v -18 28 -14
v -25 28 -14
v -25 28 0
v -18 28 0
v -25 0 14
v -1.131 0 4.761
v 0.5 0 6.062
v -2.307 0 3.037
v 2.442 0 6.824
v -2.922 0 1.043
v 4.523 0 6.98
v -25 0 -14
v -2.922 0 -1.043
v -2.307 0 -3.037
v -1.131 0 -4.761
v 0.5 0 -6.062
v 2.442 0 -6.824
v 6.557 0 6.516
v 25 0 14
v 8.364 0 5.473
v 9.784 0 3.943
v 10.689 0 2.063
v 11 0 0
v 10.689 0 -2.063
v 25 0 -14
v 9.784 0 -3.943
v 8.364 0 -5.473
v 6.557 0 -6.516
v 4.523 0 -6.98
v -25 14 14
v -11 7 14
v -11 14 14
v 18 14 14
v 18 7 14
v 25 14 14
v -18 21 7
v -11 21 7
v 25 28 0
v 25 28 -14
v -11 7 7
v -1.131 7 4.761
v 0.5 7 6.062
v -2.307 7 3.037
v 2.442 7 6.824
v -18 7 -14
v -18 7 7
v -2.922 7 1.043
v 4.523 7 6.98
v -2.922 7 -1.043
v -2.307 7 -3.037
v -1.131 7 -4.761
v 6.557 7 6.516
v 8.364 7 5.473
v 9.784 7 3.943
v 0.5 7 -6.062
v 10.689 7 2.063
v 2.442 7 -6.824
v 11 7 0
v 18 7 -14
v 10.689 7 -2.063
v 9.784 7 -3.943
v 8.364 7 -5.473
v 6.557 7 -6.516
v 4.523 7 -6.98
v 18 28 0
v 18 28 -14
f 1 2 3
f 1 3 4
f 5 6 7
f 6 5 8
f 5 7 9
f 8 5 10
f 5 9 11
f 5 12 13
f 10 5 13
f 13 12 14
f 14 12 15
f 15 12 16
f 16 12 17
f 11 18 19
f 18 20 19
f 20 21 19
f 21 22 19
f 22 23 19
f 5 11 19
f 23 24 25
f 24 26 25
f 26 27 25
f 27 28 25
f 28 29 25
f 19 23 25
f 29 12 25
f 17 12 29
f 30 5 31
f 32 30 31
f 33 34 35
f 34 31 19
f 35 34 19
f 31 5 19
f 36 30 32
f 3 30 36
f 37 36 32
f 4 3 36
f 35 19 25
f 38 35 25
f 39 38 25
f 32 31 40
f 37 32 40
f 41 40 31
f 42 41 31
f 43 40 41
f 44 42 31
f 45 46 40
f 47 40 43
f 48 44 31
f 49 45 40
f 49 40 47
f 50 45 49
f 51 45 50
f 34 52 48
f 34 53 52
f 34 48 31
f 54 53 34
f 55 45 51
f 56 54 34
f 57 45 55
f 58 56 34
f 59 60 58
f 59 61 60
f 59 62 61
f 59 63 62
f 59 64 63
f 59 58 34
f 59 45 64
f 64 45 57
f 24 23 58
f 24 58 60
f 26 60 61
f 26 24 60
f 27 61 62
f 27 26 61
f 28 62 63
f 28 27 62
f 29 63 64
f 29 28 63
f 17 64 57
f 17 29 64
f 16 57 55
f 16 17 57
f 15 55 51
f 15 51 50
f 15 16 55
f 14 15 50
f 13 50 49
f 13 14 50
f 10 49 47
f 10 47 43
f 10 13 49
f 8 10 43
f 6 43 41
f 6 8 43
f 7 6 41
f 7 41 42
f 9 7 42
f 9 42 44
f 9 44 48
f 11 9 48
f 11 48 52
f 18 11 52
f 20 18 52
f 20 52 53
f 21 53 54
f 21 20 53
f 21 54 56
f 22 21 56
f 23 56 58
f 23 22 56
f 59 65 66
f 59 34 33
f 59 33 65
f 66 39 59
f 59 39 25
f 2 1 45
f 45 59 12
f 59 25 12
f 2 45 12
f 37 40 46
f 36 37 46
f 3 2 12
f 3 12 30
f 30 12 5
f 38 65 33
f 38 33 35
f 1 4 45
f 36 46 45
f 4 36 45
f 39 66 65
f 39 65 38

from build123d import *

# Parameters (mm, degrees)
SKETCH1_R           = 7
BOSS_EXTRUDE1_DEPTH = 7
SKETCH1_3_W         = 7
SKETCH1_3_H         = 28
BOSS_EXTRUDE2_DEPTH = 28
CHAMFER1_SIZE       = 14


with BuildPart() as part:
    # Sketch1 → Boss-Extrude1 (new body)
    with BuildSketch(Plane(origin=(0, 0, 0), x_dir=(1, 0, 0), z_dir=(0, 1, 0))):
        Polygon((18, -14), (18, 14), (-18, 14), (-18, -7), (-11, -7), (-11, -14), align=None)
        with Locations((4, 0)):
            Circle(SKETCH1_R, mode=Mode.SUBTRACT)
    extrude(amount=BOSS_EXTRUDE1_DEPTH)

    # Sketch1<3> → Boss-Extrude2 (add)
    with BuildSketch(Plane(origin=(0, 0, 0), x_dir=(1, 0, 0), z_dir=(0, 1, 0))):
        Polygon((-18, -7), (-18, 14), (-25, 14), (-25, -14), (-11, -14), (-11, -7), align=None)
        with Locations((21.5, 0)):
            Rectangle(SKETCH1_3_W, SKETCH1_3_H)
    extrude(amount=BOSS_EXTRUDE2_DEPTH)

    # Chamfer1
    chamfer1_edges = [part.edges().sort_by_distance(p)[0] for p in [
        (-18, 28, 14),
        (21.5, 28, 14),
    ]]
    chamfer(chamfer1_edges, length=CHAMFER1_SIZE)


solid = part.part
